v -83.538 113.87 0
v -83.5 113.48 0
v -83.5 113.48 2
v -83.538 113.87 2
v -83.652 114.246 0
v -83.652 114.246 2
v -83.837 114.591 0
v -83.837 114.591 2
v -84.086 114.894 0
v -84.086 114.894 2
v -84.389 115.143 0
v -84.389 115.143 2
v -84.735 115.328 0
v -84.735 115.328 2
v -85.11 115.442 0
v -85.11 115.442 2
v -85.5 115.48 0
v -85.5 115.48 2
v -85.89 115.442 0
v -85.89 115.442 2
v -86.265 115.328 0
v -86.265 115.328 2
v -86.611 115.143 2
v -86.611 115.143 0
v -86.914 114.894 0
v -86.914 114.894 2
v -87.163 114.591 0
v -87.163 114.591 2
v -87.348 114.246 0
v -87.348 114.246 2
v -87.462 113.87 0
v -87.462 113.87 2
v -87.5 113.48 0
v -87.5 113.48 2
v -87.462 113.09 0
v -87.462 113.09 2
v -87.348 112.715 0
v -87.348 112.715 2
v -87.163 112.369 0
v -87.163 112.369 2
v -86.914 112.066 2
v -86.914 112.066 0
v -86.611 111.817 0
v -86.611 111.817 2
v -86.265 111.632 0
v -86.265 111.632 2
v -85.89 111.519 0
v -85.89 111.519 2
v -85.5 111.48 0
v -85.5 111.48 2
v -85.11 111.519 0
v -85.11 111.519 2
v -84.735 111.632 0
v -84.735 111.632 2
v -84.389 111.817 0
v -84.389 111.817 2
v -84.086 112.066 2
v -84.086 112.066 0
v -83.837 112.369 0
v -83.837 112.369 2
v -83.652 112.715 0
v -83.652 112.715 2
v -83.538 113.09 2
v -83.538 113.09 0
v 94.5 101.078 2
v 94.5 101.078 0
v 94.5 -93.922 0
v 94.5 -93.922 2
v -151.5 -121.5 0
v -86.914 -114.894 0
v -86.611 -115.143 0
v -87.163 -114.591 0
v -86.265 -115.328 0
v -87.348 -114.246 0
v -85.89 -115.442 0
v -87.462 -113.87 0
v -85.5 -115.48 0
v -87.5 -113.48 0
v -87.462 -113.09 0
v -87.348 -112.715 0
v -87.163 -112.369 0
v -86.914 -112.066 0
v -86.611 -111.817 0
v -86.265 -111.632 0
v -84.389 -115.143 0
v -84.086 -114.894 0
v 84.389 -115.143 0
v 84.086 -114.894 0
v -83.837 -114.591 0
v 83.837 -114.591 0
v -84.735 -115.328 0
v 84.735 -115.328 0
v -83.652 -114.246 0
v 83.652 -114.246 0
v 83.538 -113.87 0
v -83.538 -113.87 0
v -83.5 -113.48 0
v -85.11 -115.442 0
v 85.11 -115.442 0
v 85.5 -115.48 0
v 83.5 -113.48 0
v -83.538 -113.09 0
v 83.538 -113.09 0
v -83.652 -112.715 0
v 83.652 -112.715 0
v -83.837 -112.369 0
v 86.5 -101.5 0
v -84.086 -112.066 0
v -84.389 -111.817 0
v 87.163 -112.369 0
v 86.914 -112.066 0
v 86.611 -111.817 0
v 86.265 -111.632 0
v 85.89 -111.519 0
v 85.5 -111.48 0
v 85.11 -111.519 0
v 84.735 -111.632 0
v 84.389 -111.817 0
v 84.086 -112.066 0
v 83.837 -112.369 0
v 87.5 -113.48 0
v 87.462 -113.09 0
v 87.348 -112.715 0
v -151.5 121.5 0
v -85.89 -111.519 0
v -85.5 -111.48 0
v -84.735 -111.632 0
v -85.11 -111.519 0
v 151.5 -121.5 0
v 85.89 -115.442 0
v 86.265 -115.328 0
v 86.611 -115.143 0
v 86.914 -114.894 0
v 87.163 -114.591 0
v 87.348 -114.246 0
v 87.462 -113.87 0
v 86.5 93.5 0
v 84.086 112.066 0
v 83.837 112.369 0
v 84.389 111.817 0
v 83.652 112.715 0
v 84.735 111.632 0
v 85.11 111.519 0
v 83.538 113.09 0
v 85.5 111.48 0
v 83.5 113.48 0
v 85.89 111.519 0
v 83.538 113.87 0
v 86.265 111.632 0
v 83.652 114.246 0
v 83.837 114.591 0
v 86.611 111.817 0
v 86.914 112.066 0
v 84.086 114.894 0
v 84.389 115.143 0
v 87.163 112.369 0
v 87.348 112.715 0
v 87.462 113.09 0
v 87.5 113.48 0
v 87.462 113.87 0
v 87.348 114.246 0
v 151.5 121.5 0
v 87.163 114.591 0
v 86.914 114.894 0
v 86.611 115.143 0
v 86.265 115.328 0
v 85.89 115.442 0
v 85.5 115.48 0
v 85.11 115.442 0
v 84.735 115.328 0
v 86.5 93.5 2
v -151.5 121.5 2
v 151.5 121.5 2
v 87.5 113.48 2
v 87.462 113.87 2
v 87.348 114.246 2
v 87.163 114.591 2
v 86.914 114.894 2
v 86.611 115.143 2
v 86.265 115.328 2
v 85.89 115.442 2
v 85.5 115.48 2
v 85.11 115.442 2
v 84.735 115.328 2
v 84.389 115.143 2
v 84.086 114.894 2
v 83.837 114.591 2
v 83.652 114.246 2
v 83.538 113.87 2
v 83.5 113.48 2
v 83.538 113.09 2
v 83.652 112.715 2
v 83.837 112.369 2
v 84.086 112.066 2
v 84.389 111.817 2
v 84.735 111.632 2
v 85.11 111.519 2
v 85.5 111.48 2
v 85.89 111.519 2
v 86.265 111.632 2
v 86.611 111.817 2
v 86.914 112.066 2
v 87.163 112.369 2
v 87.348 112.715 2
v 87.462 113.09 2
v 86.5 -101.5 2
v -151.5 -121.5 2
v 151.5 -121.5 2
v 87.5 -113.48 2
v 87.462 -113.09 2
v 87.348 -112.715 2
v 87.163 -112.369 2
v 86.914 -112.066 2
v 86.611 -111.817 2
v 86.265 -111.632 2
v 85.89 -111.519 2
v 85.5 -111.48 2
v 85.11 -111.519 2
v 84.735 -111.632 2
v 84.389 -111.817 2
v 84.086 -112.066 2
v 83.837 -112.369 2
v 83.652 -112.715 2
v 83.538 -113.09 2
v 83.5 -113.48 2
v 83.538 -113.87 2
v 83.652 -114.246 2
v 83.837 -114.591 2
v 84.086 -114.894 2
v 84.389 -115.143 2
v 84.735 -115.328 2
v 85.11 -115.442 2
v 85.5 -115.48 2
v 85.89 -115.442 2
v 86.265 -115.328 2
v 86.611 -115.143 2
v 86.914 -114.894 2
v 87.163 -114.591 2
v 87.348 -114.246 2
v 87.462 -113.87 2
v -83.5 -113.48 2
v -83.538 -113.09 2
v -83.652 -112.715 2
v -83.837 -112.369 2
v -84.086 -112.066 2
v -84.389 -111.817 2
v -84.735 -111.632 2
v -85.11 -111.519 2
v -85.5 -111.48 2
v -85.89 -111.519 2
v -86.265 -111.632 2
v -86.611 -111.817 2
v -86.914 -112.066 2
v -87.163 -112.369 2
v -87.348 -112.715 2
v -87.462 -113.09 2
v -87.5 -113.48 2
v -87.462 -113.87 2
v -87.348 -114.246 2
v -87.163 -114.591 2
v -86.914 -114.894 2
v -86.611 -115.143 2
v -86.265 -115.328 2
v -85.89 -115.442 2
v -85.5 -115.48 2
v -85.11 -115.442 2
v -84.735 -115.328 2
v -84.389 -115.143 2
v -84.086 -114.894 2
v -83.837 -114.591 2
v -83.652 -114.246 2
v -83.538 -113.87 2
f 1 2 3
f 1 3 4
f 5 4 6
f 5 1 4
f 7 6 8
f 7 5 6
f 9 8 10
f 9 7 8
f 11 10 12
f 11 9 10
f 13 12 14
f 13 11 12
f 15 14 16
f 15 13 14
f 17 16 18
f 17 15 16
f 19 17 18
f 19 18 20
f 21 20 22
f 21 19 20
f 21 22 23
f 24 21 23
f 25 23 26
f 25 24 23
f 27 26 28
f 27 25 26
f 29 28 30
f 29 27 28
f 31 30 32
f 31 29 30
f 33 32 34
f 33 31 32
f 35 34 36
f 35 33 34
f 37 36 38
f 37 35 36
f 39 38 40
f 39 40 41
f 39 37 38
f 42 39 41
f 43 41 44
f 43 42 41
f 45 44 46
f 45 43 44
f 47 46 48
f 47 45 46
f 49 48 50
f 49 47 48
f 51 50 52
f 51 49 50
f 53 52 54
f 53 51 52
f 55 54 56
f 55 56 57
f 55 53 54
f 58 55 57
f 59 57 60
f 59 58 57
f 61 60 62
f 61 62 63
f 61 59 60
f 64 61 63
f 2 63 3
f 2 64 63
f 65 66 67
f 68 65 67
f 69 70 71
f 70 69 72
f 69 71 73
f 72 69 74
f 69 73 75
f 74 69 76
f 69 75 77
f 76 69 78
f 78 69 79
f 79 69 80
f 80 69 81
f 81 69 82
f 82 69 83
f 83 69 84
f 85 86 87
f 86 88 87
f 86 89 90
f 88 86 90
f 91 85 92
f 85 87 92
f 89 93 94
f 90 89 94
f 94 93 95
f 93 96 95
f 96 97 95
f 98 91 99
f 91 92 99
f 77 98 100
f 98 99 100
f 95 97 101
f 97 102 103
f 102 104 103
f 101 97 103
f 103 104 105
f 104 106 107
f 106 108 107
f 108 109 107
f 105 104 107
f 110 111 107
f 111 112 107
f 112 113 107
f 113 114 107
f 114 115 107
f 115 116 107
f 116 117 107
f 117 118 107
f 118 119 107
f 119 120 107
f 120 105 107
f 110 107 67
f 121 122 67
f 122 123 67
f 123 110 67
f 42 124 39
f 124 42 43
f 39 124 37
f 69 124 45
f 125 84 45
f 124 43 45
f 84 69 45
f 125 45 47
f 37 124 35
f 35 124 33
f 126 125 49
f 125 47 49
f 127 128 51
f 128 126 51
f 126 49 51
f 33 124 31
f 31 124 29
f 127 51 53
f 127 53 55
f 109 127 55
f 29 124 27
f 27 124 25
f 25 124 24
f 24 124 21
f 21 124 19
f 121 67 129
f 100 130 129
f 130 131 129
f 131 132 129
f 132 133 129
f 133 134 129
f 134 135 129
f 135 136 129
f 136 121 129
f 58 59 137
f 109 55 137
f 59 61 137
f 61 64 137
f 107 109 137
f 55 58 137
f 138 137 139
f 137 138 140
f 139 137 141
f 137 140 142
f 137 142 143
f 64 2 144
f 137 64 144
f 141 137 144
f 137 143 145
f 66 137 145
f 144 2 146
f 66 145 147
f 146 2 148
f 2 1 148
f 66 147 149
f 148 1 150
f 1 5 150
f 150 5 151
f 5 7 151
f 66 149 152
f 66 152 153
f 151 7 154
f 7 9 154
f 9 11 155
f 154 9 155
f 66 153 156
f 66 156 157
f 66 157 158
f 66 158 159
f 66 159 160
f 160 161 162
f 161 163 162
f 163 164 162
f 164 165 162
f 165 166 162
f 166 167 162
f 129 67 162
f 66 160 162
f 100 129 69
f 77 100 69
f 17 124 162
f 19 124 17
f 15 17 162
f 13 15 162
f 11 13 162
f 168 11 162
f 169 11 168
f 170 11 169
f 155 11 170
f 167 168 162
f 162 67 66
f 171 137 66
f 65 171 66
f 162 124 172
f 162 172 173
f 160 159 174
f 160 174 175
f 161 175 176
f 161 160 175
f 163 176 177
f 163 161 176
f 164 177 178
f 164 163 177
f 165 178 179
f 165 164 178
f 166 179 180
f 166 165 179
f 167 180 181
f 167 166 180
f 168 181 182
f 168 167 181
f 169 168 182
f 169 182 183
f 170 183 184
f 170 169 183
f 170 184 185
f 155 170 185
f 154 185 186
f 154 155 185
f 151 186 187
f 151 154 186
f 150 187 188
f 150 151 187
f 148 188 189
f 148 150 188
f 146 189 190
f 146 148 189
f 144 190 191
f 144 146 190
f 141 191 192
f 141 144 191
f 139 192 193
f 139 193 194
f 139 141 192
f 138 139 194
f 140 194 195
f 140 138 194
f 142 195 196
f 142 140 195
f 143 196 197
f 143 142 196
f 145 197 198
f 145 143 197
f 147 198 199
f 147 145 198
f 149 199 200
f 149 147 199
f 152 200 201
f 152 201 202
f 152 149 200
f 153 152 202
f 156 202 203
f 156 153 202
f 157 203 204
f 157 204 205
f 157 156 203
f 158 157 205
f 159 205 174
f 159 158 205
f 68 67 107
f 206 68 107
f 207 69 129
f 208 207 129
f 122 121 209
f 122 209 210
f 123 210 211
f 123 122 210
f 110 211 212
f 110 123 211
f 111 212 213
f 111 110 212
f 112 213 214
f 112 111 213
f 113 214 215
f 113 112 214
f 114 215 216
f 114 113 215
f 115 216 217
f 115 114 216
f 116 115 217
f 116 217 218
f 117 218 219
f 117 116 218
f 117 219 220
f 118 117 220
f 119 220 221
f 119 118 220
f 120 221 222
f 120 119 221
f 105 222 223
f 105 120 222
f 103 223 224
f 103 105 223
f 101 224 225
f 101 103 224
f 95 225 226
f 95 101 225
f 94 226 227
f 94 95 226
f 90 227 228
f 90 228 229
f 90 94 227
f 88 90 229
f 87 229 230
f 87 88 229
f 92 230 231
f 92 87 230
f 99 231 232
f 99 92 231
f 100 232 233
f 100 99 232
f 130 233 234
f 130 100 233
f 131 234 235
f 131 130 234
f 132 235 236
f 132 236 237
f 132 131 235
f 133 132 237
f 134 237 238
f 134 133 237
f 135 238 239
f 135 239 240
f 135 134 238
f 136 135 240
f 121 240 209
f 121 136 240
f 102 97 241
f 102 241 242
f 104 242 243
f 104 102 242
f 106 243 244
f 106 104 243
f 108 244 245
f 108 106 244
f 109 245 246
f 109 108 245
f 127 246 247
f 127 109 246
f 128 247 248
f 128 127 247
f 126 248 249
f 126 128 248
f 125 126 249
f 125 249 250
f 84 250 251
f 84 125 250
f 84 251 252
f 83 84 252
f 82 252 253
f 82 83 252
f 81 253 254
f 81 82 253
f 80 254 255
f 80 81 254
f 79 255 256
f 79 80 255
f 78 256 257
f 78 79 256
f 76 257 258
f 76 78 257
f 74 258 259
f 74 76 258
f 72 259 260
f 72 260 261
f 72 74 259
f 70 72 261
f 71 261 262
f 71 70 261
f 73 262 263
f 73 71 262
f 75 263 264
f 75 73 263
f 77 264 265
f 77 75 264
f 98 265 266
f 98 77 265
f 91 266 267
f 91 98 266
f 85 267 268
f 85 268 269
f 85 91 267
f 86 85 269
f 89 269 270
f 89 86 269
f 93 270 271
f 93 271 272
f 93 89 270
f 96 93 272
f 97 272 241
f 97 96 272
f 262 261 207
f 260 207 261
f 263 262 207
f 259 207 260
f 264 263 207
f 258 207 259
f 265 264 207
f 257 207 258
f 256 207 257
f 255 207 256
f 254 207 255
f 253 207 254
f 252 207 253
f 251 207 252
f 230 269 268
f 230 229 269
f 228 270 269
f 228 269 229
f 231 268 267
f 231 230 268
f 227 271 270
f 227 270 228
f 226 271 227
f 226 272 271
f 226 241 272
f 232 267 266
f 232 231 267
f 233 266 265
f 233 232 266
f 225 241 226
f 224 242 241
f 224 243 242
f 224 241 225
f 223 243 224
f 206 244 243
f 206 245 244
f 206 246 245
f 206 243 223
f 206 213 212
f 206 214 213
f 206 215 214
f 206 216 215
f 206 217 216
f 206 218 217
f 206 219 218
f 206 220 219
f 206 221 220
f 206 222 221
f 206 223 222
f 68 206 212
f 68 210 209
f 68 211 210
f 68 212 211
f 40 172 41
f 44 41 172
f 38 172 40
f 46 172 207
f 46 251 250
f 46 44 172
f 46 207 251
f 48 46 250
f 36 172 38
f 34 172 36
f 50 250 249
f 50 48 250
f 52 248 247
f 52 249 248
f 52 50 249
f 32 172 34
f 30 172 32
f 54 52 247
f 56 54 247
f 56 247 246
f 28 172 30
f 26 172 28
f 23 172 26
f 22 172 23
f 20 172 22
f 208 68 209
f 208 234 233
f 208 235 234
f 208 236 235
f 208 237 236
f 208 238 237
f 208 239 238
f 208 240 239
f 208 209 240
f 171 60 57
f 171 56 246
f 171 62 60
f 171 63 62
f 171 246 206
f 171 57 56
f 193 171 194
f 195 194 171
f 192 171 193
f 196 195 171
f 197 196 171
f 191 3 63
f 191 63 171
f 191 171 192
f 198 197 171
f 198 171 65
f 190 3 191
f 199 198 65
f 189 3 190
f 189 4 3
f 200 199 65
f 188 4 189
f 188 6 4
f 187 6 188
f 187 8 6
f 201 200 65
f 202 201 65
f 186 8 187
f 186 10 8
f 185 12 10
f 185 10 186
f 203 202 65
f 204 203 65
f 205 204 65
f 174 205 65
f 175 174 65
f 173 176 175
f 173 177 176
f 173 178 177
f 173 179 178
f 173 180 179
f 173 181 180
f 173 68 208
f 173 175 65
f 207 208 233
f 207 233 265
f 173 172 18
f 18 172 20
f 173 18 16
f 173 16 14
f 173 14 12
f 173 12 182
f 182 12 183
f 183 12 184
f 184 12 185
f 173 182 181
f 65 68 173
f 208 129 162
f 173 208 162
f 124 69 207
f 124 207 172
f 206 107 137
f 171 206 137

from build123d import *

# Parameters (mm, degrees)
SKETCH1_W           = 303
SKETCH1_H           = 243
SKETCH1_R           = 2
BOSS_EXTRUDE1_DEPTH = 2


with BuildPart() as part:
    # Sketch1 → Boss-Extrude1 (new body)
    with BuildSketch(Plane.XY):
        Rectangle(SKETCH1_W, SKETCH1_H)
        with Locations((85.5, -113.48019802)):
            Circle(SKETCH1_R, mode=Mode.SUBTRACT)
        with Locations((85.5, 113.48019802)):
            Circle(SKETCH1_R, mode=Mode.SUBTRACT)
        with Locations((-85.5, 113.48019802)):
            Circle(SKETCH1_R, mode=Mode.SUBTRACT)
        with Locations((-85.5, -113.48019802)):
            Circle(SKETCH1_R, mode=Mode.SUBTRACT)
        Polygon((94.5, -93.92192355), (86.5, -101.5), (86.5, -96.5), (86.5, 93.5), (94.5, 101.07807645), (94.5, 93.5), align=None, mode=Mode.SUBTRACT)
    extrude(amount=BOSS_EXTRUDE1_DEPTH)


solid = part.part
